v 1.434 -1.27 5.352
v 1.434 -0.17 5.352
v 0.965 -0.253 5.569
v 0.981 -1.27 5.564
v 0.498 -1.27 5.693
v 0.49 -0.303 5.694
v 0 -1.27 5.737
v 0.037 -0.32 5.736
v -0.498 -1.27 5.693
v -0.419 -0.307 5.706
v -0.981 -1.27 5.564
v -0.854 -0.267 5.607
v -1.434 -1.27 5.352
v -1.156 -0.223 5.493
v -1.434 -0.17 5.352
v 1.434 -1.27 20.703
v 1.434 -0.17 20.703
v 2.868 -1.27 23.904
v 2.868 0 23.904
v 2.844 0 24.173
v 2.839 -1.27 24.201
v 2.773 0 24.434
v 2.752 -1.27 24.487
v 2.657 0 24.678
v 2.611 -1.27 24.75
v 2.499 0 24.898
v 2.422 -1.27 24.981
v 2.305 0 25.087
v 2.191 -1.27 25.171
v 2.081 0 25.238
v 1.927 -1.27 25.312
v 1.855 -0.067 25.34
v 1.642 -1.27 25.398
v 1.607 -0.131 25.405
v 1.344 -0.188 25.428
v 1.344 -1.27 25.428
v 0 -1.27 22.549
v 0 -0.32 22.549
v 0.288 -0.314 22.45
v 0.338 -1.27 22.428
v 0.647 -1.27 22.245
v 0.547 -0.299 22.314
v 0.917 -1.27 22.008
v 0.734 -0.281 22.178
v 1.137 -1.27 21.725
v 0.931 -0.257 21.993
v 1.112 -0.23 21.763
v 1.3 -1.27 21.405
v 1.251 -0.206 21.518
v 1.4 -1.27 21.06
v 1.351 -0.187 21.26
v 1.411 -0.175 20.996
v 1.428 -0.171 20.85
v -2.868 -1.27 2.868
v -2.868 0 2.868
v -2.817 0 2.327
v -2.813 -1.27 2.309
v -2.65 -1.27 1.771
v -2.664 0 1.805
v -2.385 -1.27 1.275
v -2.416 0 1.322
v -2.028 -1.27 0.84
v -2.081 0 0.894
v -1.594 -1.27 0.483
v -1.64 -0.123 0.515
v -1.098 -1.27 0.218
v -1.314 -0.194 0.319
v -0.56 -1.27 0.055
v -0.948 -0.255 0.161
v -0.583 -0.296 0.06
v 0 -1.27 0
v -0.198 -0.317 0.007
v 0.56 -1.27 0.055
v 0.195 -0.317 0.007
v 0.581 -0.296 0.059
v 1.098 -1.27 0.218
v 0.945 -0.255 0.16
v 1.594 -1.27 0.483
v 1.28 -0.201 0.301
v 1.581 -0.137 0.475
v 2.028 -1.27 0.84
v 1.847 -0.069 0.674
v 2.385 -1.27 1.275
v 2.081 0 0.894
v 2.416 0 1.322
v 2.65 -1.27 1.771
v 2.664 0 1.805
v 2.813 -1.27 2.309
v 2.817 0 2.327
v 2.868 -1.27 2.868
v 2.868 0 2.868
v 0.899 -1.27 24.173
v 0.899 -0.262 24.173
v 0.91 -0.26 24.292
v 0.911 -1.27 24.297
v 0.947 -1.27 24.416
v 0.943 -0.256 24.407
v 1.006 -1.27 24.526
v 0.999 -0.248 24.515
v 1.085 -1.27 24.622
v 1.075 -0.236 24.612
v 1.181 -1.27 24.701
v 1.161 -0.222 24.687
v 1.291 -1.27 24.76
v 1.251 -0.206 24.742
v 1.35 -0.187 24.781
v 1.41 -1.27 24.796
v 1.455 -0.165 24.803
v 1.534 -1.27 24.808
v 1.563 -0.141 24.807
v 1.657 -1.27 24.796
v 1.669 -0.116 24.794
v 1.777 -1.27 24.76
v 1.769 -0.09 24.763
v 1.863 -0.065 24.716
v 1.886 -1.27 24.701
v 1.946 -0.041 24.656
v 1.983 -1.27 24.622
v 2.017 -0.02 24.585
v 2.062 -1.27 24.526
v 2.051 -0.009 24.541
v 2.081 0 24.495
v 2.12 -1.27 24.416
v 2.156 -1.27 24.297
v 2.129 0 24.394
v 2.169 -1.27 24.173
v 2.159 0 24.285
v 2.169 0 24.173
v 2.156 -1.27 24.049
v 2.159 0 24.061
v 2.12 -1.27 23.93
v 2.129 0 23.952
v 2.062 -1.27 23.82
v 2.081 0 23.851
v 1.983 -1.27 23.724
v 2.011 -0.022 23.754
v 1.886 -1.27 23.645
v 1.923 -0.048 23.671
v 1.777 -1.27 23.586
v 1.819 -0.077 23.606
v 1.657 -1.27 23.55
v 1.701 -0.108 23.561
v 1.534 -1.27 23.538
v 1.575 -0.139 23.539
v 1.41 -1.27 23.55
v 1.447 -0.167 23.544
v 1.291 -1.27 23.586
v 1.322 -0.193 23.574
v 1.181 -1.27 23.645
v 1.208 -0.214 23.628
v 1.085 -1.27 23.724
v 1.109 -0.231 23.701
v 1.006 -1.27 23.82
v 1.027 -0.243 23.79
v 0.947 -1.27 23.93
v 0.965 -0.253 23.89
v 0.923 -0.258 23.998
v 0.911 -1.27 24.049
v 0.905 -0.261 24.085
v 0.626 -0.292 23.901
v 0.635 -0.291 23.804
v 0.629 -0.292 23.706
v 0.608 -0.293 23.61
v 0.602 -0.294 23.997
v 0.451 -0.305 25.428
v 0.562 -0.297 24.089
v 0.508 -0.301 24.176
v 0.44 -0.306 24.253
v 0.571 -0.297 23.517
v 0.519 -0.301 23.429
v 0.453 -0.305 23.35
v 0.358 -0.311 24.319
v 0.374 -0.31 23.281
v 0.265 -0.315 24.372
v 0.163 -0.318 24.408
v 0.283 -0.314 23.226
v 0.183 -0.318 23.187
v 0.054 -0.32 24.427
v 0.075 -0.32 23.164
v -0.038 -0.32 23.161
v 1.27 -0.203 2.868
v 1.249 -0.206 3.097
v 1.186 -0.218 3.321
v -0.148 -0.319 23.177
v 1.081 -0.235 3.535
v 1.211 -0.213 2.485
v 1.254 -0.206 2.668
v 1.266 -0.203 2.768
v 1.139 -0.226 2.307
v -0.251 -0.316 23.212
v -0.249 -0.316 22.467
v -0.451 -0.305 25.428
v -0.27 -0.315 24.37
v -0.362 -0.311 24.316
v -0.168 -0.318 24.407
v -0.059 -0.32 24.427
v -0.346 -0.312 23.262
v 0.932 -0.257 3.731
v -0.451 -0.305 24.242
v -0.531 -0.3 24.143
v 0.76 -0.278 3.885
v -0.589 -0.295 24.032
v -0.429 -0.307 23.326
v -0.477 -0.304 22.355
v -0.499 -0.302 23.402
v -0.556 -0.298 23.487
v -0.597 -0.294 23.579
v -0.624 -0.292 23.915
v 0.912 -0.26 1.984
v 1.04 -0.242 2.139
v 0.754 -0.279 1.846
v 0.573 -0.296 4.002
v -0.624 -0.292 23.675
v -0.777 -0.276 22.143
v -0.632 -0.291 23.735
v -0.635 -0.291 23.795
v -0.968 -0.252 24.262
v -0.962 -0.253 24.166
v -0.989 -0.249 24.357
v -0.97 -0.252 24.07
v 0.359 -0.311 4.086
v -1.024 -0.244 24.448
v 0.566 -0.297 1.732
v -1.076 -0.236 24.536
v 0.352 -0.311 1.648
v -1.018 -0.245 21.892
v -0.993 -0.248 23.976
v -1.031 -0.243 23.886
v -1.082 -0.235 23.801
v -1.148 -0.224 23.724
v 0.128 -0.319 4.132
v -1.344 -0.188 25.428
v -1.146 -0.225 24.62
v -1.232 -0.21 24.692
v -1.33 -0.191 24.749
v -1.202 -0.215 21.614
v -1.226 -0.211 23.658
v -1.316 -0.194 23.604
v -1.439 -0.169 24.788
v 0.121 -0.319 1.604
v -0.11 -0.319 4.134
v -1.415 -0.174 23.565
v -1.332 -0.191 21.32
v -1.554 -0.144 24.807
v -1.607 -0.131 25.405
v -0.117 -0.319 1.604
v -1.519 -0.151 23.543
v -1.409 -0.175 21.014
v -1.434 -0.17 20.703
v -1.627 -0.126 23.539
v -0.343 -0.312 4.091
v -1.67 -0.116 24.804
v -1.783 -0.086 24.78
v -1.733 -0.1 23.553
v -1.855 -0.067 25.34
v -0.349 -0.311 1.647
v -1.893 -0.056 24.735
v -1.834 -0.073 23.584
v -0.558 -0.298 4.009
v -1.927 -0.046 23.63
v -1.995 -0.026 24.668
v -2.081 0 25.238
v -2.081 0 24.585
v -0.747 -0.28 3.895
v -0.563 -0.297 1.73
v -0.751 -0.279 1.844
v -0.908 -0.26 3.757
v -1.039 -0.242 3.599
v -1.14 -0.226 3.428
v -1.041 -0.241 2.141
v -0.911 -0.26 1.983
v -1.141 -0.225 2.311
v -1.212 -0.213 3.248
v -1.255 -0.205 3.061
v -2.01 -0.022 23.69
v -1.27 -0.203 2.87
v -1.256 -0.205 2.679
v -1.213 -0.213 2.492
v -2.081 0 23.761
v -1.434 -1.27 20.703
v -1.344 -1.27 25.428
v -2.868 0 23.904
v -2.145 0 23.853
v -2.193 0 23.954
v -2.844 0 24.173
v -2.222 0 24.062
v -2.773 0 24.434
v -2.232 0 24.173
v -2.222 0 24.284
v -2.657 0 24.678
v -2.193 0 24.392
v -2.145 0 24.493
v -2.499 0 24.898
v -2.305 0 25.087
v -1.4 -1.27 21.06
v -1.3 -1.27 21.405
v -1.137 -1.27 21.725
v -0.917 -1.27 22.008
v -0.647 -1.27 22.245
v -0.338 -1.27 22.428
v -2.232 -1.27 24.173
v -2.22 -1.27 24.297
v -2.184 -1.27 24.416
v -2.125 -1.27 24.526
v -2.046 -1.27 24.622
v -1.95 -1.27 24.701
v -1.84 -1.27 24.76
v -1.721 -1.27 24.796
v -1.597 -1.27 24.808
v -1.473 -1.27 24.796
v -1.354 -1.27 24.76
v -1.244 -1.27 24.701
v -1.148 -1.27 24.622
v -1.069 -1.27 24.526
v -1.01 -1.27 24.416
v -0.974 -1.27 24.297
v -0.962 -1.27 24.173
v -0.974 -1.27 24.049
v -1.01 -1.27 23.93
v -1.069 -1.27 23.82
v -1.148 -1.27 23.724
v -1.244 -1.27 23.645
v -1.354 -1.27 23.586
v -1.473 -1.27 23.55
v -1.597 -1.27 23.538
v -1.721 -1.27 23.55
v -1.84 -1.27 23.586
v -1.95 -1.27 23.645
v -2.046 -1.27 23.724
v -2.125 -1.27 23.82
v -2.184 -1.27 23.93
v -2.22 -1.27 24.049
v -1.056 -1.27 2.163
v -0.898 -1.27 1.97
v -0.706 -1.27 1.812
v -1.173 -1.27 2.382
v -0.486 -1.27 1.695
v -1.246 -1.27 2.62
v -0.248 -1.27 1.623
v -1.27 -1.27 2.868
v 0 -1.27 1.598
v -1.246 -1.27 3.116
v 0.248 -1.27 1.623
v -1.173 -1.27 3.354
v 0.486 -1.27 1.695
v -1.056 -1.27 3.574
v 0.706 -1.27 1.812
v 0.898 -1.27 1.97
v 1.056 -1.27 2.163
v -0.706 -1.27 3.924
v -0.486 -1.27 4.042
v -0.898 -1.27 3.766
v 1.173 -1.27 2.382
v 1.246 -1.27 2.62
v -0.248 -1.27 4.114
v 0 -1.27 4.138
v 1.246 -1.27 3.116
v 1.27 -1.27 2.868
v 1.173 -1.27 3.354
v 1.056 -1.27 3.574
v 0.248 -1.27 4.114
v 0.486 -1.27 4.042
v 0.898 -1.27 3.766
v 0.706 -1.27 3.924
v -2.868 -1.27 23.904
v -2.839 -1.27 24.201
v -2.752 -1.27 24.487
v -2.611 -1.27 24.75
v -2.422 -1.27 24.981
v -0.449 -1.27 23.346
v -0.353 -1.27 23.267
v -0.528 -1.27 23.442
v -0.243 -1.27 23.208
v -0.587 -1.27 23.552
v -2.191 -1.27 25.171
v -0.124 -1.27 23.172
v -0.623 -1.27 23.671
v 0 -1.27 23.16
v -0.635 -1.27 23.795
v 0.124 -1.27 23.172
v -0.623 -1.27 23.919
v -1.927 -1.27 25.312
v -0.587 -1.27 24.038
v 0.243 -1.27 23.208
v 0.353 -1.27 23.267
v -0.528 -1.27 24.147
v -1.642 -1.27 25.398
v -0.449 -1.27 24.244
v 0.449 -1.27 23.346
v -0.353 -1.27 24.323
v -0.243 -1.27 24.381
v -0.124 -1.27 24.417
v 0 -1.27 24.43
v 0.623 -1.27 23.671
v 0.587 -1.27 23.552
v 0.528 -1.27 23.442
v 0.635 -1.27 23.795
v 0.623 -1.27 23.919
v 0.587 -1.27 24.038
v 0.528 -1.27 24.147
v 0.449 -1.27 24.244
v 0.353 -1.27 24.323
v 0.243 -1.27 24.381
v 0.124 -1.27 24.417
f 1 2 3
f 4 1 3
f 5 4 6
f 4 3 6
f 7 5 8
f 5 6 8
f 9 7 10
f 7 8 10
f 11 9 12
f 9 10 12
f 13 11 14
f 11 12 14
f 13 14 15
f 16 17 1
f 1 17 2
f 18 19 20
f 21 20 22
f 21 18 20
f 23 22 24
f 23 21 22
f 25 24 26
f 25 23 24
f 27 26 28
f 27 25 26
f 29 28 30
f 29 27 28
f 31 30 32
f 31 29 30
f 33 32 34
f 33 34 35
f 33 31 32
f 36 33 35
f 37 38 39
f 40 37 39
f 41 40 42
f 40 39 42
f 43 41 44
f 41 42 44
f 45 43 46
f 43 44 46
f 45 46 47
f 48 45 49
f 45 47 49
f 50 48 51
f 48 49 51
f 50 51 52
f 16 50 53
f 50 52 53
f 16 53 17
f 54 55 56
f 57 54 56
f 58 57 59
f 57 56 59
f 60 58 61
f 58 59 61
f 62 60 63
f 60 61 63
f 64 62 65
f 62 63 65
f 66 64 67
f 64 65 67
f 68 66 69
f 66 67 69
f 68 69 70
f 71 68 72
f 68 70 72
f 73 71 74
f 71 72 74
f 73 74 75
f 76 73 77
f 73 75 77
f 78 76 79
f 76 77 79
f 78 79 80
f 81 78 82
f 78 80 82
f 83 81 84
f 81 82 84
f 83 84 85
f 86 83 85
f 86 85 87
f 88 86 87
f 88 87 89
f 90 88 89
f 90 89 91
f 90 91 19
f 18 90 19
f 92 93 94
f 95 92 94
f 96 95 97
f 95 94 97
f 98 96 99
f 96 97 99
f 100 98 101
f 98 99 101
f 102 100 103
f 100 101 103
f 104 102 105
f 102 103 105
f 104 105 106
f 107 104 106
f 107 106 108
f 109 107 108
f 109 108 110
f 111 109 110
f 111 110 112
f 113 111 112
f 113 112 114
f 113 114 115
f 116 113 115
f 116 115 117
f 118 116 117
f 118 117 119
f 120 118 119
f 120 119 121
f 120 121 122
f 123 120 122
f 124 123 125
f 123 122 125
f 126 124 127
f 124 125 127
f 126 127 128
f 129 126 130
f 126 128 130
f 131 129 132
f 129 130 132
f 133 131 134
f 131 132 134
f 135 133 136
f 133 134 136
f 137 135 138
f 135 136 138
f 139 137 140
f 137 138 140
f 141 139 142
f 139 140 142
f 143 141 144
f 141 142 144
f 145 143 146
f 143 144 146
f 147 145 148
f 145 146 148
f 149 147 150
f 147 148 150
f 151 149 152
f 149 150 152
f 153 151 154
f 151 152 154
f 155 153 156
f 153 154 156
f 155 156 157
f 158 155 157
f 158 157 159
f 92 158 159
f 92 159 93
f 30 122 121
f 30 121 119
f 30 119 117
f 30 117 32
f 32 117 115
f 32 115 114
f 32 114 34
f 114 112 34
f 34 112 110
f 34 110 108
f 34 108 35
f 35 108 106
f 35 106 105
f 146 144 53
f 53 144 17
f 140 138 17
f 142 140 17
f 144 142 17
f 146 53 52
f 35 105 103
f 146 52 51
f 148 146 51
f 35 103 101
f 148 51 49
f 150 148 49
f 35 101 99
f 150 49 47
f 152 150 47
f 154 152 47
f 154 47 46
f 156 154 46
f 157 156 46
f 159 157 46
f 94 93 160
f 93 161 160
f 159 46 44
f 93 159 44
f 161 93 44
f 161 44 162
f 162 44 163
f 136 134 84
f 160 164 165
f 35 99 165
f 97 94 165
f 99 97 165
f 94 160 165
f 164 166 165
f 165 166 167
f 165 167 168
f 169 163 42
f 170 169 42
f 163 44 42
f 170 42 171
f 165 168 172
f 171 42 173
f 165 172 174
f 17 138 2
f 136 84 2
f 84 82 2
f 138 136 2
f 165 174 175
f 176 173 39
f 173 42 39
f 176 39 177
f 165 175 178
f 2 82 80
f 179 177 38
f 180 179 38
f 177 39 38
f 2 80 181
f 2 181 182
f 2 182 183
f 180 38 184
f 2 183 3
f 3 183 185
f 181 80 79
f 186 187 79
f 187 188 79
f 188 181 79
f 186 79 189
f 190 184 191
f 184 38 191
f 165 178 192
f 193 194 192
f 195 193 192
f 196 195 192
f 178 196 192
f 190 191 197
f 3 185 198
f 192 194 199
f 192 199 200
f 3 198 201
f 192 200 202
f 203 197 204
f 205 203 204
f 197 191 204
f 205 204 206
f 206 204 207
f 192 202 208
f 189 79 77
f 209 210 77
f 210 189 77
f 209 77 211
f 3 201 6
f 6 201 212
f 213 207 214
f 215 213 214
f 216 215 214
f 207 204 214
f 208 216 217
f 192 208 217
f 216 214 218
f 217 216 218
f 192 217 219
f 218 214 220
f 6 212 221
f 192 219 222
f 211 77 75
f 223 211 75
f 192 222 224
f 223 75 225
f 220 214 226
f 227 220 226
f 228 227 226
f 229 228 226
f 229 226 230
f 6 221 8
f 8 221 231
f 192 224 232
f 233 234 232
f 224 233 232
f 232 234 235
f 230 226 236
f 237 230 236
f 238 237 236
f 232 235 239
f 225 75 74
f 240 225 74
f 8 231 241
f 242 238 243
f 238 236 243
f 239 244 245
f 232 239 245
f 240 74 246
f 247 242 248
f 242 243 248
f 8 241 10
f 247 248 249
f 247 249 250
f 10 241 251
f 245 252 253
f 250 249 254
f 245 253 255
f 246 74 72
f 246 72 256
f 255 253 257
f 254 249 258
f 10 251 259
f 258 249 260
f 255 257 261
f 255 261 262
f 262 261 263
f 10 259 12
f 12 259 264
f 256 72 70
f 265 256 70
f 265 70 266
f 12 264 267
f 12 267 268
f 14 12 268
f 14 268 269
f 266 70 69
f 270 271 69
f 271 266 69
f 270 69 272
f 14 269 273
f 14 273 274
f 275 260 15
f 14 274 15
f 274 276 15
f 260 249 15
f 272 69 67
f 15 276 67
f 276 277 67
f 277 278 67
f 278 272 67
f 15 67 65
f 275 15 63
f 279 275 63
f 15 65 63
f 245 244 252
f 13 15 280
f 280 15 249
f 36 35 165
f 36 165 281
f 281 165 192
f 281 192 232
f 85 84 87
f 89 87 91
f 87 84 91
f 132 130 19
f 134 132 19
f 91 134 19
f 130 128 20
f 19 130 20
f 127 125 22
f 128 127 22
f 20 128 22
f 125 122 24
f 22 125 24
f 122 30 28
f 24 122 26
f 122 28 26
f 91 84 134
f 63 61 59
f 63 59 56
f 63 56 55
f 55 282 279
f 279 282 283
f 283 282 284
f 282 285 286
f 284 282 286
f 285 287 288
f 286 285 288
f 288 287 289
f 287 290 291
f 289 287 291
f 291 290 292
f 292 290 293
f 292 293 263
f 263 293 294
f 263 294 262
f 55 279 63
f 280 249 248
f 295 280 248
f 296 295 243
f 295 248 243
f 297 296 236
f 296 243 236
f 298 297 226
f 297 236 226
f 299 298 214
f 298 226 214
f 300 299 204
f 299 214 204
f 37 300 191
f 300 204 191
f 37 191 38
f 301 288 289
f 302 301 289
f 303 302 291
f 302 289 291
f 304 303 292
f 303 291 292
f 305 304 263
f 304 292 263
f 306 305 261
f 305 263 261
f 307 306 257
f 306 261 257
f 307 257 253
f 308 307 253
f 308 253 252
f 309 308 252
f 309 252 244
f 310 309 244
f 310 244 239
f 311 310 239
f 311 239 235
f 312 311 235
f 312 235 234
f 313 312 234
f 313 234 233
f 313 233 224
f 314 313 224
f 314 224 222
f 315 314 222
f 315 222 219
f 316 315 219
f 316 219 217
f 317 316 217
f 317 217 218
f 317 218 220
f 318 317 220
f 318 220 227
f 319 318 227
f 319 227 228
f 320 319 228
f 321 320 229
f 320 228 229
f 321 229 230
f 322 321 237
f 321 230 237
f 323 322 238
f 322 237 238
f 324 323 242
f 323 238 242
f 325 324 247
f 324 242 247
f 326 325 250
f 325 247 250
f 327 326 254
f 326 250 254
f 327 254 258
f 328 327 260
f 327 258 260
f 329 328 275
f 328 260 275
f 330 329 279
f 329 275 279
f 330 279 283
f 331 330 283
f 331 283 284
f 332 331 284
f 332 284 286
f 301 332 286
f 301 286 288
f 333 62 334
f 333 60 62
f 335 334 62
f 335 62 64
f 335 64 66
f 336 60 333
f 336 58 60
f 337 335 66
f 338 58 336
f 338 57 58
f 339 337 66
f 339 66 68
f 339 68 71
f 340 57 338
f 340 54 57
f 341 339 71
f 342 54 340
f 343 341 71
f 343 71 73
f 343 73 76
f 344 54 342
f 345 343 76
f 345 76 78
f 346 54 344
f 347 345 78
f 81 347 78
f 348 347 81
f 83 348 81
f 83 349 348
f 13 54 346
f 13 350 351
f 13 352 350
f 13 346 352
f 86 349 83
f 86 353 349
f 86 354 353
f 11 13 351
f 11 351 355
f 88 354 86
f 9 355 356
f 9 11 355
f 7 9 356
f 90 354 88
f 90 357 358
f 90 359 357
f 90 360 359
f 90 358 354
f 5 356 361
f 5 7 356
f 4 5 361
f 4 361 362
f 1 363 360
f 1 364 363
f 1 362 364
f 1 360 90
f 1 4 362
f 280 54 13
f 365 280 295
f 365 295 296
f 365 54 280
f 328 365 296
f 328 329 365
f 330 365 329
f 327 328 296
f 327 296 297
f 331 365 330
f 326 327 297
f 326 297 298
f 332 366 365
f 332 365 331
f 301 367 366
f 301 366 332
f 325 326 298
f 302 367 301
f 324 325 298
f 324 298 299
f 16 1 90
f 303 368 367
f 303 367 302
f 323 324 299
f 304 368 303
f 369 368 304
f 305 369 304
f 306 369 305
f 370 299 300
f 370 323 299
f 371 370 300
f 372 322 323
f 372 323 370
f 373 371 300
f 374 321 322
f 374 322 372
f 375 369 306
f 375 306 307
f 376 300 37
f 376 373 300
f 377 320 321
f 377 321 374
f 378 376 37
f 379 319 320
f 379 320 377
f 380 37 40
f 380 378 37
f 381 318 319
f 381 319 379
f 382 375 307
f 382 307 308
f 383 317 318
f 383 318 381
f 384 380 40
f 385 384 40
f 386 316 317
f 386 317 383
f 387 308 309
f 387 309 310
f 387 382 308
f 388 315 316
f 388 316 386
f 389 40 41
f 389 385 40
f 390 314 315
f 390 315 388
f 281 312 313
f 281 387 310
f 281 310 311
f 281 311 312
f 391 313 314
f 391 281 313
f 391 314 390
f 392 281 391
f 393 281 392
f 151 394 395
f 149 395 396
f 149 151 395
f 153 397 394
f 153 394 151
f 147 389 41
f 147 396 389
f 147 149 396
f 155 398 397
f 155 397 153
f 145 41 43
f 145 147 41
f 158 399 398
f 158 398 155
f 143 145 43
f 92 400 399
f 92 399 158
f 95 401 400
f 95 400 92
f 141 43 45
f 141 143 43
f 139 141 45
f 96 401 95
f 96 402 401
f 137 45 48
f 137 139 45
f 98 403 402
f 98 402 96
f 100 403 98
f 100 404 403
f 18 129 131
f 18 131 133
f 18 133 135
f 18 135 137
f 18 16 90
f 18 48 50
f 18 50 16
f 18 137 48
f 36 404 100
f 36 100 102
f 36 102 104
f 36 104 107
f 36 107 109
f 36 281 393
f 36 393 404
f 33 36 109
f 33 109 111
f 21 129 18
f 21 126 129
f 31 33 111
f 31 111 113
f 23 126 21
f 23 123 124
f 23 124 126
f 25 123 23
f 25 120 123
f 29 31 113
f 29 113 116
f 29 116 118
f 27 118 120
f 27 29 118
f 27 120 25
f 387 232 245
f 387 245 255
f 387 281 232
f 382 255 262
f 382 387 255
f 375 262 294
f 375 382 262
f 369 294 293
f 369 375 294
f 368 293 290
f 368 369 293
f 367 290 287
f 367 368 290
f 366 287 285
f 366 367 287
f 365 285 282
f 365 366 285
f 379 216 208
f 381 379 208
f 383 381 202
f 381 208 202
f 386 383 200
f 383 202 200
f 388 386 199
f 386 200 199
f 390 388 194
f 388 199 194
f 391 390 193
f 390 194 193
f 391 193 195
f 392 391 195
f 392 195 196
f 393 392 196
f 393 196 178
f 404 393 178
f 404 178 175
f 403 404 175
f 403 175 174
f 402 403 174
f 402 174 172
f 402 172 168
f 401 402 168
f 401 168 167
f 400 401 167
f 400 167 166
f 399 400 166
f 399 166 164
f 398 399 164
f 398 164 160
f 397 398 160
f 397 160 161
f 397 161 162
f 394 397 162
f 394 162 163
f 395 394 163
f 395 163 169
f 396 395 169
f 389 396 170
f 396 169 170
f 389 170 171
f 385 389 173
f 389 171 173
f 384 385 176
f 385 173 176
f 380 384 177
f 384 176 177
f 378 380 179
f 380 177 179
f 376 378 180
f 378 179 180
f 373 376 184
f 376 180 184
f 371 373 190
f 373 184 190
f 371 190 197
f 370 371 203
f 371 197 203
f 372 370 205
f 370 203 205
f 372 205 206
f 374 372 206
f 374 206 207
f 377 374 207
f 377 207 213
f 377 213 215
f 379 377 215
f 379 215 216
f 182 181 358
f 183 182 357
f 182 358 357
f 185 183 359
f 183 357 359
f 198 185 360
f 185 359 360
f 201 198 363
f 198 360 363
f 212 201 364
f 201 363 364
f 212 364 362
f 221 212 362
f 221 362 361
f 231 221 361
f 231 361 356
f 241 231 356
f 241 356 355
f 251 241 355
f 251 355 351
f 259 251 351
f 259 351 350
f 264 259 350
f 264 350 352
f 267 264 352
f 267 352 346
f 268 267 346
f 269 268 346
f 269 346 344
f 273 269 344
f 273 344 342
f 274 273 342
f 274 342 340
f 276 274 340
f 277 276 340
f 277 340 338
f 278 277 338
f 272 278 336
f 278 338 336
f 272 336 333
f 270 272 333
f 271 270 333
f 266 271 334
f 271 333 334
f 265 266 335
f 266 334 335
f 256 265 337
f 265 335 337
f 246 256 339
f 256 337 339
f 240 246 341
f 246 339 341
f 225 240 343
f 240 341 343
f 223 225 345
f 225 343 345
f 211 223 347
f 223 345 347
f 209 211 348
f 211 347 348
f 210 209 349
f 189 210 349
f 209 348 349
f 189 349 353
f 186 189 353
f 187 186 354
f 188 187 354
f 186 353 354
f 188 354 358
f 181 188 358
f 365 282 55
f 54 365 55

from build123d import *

# Parameters (mm, degrees)
F1_DEPTH    = 1.27
F3_D        = 2.54
F3_DEPTH    = 6.35
F3_TIP      = 0.7630929862
F4_R        = 1.524
F6_D        = 1.27
F6_DEPTH    = 6.35
F6_TIP      = 0.3815464931
F7_T1_DEPTH = 1.27
F9_D        = 13.843
F9_DEPTH    = 304.8
F9_TIP      = 4.1588567746


# Not quite as in the source:
# - a fillet or chamfer that OpenCascade refuses, or shapes differently, is made with other operations: its cross-section is extruded or revolved along the edge and cut away or added


with BuildPart() as f1:
    # F0 (on Front) → F1 (new body)
    with BuildSketch(Plane.XZ):
        with BuildLine():
            ThreePointArc((1.4341250062, 5.3522273875), (2.4839773751, 4.3023750186), (2.8682500124, 2.8682500124))
            Line((2.8682500124, 2.8682500124), (2.8682500124, 25.4276227206))
            Line((2.8682500124, 25.4276227206), (0, 25.4276227206))
            Line((0, 25.4276227206), (-1.4341250062, 25.4276227206))
            Line((-1.4341250062, 25.4276227206), (-2.8682500124, 25.4276227206))
            Line((-2.8682500124, 25.4276227206), (-2.8682500124, 2.8682500124))
            ThreePointArc((-2.8682500124, 2.8682500124), (-2.4839773751, 4.3023750186), (-1.4341250062, 5.3522273875))
            Line((-1.4341250062, 5.3522273875), (-1.4341250062, 22.6080268621))
            Line((-1.4341250062, 22.6080268621), (1.4341250062, 22.6080268621))
            Line((1.4341250062, 22.6080268621), (1.4341250062, 5.3522273875))
        make_face()
        with BuildLine():
            ThreePointArc((-2.8682500124, 2.8682500124), (0, 0), (2.8682500124, 2.8682500124))
            ThreePointArc((2.8682500124, 2.8682500124), (2.4839773751, 4.3023750186), (1.4341250062, 5.3522273875))
            ThreePointArc((1.4341250062, 5.3522273875), (0, 5.7365000248), (-1.4341250062, 5.3522273875))
            ThreePointArc((-1.4341250062, 5.3522273875), (-2.4839773751, 4.3023750186), (-2.8682500124, 2.8682500124))
        make_face()
    extrude(amount=F1_DEPTH)

    # F3
    with Locations(Plane(origin=(0, 0, 0), x_dir=(-1, 0, 0), z_dir=(0, 1, 0))):
        with Locations((0, 2.8682500124)):
            Hole(F3_D / 2, depth=F3_DEPTH)
            with Locations((0, 0, -(F3_DEPTH + F3_TIP / 2))):  # 118° drill point
                Cone(0, F3_D / 2, F3_TIP, mode=Mode.SUBTRACT)

    # F4
    f4_edges = [f1.edges().sort_by_distance(p)[0] for p in [
        (2.86825, -0.635, 25.427623),
        (-2.86825, -0.635, 25.427623),
    ]]
    fillet(f4_edges, radius=F4_R)

    # F6
    with Locations(Plane.XZ.offset(1.27)):
        with Locations((-1.5970880988, 24.1730304042), (0, 23.7946401586), (1.5335635452, 24.1730304042)):
            Hole(F6_D / 2, depth=F6_DEPTH)
            with Locations((0, 0, -(F6_DEPTH + F6_TIP / 2))):  # 118° drill point
                Cone(0, F6_D / 2, F6_TIP, mode=Mode.SUBTRACT)

    # F7: fillet of radius 1.905 on 2 edges, made by hand

    # F7_s2 → F7_t1 (join)
    with BuildSketch(Plane.XZ):
        with BuildLine():
            ThreePointArc((-0.4708749938, 22.6080268621), (0.8761634244, 22.0500652803), (1.4341250062, 20.7030268621))
            Line((1.4341250062, 20.7030268621), (1.4341250062, 22.6080268621))
            Line((1.4341250062, 22.6080268621), (-0.4708749938, 22.6080268621))
        make_face()
        with BuildLine():
            ThreePointArc((-1.4341250062, 20.7030268621), (-0.8761634244, 22.0500652803), (0.4708749938, 22.6080268621))
            Line((0.4708749938, 22.6080268621), (-1.4341250062, 22.6080268621))
            Line((-1.4341250062, 22.6080268621), (-1.4341250062, 20.7030268621))
        make_face()
    extrude(amount=F7_T1_DEPTH)

    # F9
    with Locations(Plane.XY.offset(25.4276227206)):
        with Locations((0, 6.6013582982)):
            Hole(F9_D / 2, depth=F9_DEPTH)
            with Locations((0, 0, -(F9_DEPTH + F9_TIP / 2))):  # 118° drill point
                Cone(0, F9_D / 2, F9_TIP, mode=Mode.SUBTRACT)


solid = f1.part
